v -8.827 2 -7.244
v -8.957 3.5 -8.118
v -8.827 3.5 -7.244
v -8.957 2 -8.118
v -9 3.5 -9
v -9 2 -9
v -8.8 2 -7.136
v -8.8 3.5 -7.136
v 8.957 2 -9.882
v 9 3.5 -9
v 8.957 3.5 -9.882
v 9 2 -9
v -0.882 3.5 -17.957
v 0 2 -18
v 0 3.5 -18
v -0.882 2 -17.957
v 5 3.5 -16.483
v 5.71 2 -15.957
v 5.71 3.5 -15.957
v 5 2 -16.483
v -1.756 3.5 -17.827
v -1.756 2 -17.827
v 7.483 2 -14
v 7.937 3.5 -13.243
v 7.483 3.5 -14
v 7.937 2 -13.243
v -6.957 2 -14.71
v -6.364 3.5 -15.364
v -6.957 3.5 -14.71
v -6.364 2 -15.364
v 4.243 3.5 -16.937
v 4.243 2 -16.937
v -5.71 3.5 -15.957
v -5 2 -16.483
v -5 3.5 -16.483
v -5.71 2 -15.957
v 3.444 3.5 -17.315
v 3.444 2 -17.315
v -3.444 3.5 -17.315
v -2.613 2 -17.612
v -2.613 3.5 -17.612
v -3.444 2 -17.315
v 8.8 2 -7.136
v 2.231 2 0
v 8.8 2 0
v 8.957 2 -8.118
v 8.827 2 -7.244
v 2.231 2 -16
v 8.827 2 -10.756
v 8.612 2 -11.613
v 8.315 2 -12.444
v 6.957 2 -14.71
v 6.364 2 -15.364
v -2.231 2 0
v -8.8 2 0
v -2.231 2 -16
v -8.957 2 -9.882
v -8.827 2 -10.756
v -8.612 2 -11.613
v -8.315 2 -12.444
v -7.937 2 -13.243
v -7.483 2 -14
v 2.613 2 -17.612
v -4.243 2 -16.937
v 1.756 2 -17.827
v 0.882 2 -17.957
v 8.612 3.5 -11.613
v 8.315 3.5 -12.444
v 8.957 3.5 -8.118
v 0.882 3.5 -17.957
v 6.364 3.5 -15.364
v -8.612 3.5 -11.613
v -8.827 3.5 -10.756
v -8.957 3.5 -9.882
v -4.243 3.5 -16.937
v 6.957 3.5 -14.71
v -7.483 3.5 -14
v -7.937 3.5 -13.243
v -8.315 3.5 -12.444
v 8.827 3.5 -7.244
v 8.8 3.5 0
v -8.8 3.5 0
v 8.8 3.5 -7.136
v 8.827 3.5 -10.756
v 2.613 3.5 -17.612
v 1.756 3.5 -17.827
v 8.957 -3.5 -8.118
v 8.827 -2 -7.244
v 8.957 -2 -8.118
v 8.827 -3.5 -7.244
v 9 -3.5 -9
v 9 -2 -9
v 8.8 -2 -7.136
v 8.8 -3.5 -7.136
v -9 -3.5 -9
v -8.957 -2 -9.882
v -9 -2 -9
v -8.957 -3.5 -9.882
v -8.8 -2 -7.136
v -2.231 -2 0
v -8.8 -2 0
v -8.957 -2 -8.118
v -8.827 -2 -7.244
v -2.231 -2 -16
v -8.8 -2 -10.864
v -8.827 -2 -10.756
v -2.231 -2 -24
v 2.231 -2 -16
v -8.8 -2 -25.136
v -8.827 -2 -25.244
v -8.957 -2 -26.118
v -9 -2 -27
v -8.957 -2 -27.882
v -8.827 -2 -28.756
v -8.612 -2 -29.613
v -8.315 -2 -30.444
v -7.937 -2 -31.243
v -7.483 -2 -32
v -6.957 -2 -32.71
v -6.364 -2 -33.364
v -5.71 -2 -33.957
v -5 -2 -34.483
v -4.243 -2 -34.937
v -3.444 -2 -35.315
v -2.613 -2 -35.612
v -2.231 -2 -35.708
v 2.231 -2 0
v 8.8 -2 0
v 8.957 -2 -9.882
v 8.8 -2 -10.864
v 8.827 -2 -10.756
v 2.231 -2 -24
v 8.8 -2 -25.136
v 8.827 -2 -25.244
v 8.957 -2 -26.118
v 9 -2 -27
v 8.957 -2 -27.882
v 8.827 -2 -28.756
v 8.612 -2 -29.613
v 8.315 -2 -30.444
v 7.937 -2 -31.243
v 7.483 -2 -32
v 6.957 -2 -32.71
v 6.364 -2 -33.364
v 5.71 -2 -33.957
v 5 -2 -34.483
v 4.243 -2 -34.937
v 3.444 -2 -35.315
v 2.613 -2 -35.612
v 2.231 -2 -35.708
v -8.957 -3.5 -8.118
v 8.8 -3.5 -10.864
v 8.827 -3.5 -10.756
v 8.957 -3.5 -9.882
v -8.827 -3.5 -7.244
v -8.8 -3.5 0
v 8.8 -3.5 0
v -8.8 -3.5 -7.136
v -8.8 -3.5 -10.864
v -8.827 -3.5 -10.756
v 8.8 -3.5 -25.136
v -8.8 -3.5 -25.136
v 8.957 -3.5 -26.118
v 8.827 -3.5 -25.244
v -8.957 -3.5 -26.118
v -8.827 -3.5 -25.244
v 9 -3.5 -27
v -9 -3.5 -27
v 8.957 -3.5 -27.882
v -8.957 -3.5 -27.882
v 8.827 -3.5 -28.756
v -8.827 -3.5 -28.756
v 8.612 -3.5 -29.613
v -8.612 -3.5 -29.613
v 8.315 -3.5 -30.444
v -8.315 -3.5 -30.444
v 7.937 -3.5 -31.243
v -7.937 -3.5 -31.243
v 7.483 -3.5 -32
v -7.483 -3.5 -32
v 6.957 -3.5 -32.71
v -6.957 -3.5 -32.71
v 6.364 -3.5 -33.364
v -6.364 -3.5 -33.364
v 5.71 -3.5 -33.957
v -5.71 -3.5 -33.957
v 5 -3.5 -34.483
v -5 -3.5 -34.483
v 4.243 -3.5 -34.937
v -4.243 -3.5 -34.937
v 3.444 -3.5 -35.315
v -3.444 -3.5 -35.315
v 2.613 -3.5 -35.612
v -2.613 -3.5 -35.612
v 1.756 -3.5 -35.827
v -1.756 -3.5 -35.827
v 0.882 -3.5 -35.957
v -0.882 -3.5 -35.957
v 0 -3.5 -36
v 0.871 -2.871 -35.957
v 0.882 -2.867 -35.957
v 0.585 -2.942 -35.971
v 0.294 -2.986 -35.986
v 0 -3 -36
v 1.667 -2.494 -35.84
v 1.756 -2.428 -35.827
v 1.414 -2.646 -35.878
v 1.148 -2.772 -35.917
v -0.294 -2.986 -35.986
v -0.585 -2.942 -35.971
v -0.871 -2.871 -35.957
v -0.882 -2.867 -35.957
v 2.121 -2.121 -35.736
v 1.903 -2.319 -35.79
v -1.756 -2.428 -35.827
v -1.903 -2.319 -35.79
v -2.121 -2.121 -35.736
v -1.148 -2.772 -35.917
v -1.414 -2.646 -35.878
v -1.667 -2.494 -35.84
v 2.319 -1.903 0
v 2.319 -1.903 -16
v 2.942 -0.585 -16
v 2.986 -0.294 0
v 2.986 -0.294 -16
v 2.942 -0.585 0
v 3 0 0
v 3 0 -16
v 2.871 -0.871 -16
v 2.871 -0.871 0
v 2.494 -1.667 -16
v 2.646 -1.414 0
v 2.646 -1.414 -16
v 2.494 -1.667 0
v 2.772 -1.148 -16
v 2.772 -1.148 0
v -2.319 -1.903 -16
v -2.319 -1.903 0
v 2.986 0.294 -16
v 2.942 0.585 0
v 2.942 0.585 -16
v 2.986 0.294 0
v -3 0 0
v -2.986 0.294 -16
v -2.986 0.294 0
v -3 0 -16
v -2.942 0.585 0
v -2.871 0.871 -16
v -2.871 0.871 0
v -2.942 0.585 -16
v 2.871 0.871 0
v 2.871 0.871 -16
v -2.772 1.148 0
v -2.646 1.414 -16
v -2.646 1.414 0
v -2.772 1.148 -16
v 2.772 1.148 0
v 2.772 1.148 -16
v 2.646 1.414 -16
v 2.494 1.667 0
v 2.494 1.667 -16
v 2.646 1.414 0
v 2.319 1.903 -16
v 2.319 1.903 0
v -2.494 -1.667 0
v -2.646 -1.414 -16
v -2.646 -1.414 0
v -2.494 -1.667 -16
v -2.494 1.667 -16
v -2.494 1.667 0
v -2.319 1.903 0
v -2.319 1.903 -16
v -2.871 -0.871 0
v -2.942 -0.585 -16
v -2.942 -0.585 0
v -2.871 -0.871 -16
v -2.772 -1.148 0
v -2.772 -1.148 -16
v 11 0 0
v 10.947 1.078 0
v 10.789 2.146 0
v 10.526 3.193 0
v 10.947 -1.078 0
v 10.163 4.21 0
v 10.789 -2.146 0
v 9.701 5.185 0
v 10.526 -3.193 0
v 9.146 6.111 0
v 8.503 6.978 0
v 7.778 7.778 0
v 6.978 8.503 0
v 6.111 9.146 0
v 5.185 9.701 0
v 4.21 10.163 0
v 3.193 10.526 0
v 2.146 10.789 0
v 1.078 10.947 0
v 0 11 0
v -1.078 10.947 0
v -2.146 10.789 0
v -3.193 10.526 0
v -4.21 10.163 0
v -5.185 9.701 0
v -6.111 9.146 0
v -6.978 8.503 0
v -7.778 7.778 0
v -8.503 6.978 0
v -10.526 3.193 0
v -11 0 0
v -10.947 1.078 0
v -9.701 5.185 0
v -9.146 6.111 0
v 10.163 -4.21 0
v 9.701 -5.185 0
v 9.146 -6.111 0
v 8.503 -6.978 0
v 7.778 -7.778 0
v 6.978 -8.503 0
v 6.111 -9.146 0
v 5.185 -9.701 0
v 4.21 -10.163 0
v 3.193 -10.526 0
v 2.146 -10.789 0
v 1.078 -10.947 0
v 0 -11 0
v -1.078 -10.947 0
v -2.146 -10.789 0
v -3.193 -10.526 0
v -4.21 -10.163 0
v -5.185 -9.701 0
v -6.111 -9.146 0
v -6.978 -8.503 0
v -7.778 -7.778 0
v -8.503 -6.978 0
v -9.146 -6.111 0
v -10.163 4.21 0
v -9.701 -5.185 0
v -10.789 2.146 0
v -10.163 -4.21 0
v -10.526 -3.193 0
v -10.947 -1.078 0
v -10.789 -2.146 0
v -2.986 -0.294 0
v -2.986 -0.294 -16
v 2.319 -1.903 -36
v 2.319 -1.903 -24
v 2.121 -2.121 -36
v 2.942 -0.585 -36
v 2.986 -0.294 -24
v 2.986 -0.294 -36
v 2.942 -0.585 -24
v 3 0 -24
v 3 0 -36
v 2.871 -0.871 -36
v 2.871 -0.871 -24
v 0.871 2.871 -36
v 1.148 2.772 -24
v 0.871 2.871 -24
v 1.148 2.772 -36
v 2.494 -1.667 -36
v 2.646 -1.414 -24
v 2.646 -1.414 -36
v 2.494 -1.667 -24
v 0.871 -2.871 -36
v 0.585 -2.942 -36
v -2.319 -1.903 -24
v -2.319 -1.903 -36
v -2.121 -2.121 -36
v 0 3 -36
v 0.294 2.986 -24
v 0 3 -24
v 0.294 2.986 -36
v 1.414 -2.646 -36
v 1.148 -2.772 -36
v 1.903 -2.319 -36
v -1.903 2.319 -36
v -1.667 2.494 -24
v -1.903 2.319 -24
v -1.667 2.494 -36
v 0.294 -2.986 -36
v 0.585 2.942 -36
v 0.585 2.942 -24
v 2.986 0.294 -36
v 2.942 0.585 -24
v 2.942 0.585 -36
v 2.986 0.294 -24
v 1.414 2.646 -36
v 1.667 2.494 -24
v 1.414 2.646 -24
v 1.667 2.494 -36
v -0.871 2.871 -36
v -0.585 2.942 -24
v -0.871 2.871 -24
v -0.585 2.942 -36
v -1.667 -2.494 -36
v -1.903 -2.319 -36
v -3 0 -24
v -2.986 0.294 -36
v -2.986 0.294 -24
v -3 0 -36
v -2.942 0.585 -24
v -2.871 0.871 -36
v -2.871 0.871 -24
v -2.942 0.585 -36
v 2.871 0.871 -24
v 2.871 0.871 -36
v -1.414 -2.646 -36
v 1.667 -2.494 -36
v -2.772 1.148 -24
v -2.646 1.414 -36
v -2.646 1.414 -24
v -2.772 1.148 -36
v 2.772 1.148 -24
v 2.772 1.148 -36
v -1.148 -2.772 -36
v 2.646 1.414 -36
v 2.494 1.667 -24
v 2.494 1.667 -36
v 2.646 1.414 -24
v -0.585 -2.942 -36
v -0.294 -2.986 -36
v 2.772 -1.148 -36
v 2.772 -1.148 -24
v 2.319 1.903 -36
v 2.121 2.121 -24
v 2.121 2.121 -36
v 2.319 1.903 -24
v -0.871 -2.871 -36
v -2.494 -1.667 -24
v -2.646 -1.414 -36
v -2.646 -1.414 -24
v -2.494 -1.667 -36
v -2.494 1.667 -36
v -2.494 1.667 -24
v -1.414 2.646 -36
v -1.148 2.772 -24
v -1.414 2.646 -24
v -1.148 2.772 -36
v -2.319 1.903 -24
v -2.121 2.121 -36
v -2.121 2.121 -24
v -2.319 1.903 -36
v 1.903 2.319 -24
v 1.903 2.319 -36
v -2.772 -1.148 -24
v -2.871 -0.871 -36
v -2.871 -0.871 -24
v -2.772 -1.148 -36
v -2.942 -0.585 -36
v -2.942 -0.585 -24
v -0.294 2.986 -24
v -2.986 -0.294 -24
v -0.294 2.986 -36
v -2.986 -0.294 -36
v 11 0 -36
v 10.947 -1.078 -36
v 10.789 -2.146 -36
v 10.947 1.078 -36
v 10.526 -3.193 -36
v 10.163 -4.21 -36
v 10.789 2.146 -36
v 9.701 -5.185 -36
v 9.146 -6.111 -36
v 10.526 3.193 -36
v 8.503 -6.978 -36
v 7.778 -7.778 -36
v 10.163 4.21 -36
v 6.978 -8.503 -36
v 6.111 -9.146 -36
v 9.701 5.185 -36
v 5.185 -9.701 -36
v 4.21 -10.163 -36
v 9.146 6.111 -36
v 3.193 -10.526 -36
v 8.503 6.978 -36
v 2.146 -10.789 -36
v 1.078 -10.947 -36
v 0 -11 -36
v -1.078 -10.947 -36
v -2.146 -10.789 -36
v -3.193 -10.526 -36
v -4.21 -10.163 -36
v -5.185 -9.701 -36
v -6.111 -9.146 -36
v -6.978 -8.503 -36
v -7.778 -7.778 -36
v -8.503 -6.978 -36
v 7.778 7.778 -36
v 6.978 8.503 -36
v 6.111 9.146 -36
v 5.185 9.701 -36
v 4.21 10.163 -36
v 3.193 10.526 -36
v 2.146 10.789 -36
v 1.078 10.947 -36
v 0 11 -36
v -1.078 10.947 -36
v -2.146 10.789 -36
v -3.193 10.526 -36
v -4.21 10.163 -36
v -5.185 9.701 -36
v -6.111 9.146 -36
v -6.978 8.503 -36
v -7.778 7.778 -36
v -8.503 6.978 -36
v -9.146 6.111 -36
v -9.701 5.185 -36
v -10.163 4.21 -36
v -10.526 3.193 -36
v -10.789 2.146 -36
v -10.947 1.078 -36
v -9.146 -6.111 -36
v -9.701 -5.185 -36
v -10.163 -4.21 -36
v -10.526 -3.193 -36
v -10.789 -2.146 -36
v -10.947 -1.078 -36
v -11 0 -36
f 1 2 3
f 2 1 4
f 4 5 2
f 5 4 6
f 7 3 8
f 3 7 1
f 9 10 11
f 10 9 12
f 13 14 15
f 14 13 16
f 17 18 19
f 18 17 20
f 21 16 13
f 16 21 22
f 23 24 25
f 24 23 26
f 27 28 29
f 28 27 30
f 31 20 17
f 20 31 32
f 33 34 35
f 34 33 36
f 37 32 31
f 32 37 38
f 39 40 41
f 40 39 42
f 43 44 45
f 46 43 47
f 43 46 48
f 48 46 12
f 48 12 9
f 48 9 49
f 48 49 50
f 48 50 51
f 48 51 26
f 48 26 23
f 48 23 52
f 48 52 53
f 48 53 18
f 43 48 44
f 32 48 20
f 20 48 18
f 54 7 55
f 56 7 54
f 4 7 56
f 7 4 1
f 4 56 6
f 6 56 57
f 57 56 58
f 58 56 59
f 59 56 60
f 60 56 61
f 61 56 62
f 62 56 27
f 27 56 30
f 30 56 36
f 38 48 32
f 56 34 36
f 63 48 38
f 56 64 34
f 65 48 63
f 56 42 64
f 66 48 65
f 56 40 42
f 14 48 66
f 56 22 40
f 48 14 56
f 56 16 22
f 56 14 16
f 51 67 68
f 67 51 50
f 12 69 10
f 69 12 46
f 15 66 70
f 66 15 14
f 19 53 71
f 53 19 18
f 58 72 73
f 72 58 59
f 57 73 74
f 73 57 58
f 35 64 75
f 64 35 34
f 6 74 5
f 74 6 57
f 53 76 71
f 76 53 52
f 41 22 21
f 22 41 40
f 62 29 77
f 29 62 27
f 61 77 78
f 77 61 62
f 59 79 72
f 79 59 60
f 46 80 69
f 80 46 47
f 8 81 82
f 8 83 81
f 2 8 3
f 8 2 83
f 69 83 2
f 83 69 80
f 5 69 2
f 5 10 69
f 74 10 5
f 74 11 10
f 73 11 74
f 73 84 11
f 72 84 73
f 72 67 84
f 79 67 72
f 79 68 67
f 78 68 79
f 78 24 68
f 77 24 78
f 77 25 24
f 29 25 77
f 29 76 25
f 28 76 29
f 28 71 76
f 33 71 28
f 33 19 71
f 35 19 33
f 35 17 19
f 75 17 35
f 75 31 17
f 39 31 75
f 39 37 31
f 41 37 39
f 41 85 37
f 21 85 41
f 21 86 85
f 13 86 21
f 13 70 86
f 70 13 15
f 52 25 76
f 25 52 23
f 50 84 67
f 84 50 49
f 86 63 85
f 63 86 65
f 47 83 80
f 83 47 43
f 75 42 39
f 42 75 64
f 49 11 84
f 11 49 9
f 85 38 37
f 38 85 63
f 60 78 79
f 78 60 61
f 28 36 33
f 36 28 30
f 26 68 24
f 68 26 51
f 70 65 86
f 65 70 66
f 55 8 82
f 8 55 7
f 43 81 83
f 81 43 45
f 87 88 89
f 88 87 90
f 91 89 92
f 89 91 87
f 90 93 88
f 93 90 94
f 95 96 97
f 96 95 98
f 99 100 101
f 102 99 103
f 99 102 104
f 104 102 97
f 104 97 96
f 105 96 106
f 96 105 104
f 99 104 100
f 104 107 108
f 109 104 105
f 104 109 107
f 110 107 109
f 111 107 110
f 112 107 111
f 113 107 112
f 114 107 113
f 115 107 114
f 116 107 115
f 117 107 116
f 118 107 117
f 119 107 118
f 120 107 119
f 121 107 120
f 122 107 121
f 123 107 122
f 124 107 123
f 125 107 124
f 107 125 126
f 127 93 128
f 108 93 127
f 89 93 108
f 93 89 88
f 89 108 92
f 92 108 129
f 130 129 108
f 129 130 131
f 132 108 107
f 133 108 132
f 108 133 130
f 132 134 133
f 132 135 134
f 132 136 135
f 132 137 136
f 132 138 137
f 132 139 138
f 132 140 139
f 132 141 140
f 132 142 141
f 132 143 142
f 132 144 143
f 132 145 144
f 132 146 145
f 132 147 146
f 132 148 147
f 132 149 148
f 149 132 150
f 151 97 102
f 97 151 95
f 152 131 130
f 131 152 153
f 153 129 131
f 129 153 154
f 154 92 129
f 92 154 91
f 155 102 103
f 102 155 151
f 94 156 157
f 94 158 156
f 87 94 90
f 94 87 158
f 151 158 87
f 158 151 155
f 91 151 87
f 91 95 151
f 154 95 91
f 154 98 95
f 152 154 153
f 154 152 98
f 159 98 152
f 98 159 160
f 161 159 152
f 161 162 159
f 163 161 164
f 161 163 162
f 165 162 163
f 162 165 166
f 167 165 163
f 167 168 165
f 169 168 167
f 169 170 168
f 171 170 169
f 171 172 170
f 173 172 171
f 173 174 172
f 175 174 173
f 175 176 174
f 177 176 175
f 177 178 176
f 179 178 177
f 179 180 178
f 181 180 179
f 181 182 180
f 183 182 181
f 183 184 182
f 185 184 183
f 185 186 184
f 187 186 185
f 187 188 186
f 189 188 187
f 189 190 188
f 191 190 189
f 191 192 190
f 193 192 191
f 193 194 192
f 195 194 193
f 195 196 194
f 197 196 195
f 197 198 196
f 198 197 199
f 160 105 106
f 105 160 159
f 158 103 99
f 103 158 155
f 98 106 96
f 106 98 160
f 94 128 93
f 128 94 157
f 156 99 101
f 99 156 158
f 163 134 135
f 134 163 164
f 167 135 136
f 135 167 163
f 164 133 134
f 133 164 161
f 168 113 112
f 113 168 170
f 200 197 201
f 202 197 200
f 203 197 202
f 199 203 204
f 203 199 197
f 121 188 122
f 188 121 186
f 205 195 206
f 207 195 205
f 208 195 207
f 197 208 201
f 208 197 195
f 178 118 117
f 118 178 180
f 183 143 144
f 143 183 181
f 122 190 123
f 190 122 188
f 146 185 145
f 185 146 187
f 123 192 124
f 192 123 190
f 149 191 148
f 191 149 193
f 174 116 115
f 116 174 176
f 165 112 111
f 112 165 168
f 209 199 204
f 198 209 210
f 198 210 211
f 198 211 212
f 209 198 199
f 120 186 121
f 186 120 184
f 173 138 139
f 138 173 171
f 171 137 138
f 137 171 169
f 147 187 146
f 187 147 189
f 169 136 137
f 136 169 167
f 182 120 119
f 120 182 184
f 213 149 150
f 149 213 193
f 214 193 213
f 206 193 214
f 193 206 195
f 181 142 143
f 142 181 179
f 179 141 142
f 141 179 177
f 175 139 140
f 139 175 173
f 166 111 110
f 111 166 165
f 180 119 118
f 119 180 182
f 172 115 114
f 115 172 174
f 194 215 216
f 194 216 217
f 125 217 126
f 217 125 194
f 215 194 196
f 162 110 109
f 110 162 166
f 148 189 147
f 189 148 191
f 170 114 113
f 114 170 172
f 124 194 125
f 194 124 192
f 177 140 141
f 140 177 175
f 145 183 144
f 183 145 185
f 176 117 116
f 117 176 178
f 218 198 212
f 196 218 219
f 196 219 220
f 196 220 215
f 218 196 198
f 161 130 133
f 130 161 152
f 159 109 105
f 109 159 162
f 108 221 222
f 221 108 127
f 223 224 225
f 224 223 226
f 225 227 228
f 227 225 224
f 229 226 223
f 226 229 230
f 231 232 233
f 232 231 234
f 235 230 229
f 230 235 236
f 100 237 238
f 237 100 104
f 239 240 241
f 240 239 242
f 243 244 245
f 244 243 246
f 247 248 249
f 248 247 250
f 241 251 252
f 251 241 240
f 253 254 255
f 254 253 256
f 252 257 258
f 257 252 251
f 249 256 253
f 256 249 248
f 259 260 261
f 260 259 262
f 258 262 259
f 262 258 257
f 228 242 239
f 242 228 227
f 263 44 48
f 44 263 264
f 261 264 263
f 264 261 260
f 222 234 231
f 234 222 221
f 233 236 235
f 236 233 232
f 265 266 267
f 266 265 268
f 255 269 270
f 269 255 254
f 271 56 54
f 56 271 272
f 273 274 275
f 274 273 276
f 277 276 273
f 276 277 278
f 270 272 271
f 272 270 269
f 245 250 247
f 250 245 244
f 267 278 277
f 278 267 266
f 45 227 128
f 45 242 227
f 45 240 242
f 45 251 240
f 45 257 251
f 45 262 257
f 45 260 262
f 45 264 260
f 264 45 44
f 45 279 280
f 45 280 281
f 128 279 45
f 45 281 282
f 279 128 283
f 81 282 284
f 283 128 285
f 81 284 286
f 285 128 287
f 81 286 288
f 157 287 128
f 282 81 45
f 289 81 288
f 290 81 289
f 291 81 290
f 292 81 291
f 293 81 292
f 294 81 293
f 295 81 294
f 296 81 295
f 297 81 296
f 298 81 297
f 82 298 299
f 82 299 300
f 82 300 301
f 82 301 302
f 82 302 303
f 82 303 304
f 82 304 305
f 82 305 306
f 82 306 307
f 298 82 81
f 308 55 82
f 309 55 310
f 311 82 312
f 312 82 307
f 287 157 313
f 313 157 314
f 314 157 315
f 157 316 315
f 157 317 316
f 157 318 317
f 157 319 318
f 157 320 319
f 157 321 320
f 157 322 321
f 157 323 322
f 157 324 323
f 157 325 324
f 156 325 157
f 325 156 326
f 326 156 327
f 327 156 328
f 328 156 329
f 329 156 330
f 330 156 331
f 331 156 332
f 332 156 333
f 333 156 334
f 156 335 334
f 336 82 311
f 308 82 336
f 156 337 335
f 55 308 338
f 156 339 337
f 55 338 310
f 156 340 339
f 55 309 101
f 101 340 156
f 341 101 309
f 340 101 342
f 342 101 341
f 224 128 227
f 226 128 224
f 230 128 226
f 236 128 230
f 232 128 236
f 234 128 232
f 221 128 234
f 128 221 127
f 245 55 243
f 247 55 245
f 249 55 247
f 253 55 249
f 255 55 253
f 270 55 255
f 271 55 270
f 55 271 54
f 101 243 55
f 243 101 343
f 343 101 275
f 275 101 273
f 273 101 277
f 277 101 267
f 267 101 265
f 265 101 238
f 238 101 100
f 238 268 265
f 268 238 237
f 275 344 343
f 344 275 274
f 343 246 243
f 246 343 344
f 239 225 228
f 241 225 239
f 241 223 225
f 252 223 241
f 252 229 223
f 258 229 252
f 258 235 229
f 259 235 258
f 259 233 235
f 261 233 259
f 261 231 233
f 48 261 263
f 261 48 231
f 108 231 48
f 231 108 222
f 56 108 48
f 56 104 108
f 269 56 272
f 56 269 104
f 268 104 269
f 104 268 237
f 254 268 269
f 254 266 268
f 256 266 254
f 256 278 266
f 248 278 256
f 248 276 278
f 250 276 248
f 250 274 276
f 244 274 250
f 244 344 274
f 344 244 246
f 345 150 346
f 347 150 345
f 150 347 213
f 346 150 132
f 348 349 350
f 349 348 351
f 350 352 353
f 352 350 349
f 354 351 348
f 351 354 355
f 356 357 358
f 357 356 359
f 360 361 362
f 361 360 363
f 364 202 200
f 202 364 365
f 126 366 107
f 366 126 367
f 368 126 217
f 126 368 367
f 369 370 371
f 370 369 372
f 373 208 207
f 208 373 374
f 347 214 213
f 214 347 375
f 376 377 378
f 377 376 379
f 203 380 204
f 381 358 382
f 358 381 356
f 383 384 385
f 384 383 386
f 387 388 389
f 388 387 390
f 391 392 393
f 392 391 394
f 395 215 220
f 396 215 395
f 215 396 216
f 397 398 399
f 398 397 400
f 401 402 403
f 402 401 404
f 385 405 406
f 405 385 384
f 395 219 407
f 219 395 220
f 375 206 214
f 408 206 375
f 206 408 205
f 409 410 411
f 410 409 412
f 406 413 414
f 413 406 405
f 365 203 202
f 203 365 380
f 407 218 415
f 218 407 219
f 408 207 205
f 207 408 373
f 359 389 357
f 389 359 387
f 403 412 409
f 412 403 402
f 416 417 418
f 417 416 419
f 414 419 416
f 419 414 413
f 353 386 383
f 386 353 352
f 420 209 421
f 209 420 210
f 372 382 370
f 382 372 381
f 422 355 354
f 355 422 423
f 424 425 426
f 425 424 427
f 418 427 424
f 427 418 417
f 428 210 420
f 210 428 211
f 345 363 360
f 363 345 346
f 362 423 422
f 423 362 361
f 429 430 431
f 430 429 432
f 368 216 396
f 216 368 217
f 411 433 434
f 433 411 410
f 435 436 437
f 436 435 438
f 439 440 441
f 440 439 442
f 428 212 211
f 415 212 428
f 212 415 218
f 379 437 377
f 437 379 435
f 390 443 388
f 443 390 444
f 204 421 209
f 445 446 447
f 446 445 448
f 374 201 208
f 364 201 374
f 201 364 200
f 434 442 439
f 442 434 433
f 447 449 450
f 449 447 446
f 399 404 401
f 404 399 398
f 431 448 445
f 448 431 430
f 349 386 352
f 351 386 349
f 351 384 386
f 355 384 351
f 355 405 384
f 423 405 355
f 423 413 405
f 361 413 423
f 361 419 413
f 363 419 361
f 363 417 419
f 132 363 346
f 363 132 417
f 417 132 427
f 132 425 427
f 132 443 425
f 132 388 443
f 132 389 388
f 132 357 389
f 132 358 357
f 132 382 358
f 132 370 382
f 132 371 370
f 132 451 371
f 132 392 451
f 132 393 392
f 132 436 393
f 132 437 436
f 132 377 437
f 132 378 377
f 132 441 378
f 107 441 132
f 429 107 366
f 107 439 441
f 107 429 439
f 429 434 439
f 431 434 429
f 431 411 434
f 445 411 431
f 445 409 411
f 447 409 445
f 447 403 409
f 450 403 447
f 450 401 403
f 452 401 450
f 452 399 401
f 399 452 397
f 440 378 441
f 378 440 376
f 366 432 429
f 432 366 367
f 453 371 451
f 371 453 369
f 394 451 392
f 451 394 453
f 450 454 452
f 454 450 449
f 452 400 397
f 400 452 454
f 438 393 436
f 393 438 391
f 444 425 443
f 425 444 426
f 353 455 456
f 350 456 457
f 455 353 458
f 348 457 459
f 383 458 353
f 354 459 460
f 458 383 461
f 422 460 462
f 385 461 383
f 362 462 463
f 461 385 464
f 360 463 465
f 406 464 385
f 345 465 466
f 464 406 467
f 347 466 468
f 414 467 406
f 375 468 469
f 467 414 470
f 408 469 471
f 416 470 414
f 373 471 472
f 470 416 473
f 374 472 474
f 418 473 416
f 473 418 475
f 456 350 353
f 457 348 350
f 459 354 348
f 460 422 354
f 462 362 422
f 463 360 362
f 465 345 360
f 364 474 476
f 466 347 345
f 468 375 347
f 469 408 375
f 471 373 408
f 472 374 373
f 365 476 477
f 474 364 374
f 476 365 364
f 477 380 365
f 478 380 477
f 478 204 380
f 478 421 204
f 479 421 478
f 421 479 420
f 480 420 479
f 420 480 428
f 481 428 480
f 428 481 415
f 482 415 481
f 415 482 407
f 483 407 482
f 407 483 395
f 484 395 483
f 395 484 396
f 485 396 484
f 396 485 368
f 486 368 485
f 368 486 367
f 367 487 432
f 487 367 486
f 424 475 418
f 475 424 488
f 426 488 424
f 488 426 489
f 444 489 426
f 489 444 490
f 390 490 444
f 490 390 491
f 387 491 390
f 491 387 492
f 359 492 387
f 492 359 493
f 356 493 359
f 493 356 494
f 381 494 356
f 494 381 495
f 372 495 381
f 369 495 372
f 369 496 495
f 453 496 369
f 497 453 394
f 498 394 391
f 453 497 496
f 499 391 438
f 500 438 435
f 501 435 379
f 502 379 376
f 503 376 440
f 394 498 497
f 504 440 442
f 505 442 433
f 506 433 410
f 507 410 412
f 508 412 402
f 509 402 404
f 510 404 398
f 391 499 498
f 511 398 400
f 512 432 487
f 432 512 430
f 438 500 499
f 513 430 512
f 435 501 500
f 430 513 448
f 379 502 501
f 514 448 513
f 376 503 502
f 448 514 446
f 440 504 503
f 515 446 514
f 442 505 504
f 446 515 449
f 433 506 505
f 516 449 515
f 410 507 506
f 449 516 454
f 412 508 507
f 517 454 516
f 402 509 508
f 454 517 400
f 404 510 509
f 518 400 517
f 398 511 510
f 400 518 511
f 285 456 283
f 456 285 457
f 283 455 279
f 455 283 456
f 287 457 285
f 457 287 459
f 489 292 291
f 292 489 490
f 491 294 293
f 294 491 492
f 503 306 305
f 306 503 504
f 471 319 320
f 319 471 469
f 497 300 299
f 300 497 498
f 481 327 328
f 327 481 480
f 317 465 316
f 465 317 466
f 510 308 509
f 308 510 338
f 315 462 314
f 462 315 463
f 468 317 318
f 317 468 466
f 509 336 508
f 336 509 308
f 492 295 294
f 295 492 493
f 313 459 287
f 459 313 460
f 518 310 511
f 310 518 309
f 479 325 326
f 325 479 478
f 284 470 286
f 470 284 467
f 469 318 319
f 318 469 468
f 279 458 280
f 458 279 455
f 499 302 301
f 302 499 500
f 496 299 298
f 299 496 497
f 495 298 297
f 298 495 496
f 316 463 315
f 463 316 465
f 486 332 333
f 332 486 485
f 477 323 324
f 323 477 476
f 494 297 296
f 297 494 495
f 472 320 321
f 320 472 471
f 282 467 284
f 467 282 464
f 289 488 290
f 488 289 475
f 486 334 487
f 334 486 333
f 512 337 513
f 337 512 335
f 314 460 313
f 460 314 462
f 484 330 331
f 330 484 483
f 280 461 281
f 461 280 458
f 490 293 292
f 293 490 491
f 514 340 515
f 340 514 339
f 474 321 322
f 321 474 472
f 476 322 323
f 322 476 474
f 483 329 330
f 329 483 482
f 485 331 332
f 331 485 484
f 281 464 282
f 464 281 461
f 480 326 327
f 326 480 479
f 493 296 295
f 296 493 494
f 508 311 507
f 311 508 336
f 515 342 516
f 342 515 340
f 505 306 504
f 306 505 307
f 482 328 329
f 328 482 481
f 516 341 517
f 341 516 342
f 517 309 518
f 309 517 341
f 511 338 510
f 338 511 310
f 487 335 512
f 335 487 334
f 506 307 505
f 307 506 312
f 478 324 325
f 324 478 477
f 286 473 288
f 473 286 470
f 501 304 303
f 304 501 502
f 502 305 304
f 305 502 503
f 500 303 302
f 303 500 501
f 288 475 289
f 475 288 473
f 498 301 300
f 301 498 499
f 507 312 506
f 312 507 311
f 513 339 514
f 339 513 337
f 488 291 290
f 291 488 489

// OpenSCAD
$fn=64;

module mill() {
	cylinder(r = 6/2, h = 16);
}

module motor() {
	cylinder(r = 6/2, h = 12);
}

module washer_without_hole() {
        cylinder(r = 18/2, h = 1.5);
}

module washer_with_cutout() {
        cylinder(r = 18/2, h = 1.5);
        translate([-9+0.2,0,0])
        cube([18-2*0.2, 18, 1.5]);
}

module washer() {
    difference() {
        washer_without_hole();
        translate([0,0,-0.25])
        cylinder(r = 6/2, h = 2);
    }
}

module holes() {

mill();
translate([0, 0, 18+6])
	motor();

translate([0,-2,18/2])
rotate([-90,0,180])
washer_with_cutout();

translate([0,2,18/2])
rotate([-90,0,0])
washer_with_cutout();

translate([0,2,18/2+18])
rotate([-90,0,0])
washer_with_cutout();
}

rotate([180,0,0])
difference() {
    cylinder(r = 22/2, h = 18*2);
    holes();
}

// vim: ft=c
